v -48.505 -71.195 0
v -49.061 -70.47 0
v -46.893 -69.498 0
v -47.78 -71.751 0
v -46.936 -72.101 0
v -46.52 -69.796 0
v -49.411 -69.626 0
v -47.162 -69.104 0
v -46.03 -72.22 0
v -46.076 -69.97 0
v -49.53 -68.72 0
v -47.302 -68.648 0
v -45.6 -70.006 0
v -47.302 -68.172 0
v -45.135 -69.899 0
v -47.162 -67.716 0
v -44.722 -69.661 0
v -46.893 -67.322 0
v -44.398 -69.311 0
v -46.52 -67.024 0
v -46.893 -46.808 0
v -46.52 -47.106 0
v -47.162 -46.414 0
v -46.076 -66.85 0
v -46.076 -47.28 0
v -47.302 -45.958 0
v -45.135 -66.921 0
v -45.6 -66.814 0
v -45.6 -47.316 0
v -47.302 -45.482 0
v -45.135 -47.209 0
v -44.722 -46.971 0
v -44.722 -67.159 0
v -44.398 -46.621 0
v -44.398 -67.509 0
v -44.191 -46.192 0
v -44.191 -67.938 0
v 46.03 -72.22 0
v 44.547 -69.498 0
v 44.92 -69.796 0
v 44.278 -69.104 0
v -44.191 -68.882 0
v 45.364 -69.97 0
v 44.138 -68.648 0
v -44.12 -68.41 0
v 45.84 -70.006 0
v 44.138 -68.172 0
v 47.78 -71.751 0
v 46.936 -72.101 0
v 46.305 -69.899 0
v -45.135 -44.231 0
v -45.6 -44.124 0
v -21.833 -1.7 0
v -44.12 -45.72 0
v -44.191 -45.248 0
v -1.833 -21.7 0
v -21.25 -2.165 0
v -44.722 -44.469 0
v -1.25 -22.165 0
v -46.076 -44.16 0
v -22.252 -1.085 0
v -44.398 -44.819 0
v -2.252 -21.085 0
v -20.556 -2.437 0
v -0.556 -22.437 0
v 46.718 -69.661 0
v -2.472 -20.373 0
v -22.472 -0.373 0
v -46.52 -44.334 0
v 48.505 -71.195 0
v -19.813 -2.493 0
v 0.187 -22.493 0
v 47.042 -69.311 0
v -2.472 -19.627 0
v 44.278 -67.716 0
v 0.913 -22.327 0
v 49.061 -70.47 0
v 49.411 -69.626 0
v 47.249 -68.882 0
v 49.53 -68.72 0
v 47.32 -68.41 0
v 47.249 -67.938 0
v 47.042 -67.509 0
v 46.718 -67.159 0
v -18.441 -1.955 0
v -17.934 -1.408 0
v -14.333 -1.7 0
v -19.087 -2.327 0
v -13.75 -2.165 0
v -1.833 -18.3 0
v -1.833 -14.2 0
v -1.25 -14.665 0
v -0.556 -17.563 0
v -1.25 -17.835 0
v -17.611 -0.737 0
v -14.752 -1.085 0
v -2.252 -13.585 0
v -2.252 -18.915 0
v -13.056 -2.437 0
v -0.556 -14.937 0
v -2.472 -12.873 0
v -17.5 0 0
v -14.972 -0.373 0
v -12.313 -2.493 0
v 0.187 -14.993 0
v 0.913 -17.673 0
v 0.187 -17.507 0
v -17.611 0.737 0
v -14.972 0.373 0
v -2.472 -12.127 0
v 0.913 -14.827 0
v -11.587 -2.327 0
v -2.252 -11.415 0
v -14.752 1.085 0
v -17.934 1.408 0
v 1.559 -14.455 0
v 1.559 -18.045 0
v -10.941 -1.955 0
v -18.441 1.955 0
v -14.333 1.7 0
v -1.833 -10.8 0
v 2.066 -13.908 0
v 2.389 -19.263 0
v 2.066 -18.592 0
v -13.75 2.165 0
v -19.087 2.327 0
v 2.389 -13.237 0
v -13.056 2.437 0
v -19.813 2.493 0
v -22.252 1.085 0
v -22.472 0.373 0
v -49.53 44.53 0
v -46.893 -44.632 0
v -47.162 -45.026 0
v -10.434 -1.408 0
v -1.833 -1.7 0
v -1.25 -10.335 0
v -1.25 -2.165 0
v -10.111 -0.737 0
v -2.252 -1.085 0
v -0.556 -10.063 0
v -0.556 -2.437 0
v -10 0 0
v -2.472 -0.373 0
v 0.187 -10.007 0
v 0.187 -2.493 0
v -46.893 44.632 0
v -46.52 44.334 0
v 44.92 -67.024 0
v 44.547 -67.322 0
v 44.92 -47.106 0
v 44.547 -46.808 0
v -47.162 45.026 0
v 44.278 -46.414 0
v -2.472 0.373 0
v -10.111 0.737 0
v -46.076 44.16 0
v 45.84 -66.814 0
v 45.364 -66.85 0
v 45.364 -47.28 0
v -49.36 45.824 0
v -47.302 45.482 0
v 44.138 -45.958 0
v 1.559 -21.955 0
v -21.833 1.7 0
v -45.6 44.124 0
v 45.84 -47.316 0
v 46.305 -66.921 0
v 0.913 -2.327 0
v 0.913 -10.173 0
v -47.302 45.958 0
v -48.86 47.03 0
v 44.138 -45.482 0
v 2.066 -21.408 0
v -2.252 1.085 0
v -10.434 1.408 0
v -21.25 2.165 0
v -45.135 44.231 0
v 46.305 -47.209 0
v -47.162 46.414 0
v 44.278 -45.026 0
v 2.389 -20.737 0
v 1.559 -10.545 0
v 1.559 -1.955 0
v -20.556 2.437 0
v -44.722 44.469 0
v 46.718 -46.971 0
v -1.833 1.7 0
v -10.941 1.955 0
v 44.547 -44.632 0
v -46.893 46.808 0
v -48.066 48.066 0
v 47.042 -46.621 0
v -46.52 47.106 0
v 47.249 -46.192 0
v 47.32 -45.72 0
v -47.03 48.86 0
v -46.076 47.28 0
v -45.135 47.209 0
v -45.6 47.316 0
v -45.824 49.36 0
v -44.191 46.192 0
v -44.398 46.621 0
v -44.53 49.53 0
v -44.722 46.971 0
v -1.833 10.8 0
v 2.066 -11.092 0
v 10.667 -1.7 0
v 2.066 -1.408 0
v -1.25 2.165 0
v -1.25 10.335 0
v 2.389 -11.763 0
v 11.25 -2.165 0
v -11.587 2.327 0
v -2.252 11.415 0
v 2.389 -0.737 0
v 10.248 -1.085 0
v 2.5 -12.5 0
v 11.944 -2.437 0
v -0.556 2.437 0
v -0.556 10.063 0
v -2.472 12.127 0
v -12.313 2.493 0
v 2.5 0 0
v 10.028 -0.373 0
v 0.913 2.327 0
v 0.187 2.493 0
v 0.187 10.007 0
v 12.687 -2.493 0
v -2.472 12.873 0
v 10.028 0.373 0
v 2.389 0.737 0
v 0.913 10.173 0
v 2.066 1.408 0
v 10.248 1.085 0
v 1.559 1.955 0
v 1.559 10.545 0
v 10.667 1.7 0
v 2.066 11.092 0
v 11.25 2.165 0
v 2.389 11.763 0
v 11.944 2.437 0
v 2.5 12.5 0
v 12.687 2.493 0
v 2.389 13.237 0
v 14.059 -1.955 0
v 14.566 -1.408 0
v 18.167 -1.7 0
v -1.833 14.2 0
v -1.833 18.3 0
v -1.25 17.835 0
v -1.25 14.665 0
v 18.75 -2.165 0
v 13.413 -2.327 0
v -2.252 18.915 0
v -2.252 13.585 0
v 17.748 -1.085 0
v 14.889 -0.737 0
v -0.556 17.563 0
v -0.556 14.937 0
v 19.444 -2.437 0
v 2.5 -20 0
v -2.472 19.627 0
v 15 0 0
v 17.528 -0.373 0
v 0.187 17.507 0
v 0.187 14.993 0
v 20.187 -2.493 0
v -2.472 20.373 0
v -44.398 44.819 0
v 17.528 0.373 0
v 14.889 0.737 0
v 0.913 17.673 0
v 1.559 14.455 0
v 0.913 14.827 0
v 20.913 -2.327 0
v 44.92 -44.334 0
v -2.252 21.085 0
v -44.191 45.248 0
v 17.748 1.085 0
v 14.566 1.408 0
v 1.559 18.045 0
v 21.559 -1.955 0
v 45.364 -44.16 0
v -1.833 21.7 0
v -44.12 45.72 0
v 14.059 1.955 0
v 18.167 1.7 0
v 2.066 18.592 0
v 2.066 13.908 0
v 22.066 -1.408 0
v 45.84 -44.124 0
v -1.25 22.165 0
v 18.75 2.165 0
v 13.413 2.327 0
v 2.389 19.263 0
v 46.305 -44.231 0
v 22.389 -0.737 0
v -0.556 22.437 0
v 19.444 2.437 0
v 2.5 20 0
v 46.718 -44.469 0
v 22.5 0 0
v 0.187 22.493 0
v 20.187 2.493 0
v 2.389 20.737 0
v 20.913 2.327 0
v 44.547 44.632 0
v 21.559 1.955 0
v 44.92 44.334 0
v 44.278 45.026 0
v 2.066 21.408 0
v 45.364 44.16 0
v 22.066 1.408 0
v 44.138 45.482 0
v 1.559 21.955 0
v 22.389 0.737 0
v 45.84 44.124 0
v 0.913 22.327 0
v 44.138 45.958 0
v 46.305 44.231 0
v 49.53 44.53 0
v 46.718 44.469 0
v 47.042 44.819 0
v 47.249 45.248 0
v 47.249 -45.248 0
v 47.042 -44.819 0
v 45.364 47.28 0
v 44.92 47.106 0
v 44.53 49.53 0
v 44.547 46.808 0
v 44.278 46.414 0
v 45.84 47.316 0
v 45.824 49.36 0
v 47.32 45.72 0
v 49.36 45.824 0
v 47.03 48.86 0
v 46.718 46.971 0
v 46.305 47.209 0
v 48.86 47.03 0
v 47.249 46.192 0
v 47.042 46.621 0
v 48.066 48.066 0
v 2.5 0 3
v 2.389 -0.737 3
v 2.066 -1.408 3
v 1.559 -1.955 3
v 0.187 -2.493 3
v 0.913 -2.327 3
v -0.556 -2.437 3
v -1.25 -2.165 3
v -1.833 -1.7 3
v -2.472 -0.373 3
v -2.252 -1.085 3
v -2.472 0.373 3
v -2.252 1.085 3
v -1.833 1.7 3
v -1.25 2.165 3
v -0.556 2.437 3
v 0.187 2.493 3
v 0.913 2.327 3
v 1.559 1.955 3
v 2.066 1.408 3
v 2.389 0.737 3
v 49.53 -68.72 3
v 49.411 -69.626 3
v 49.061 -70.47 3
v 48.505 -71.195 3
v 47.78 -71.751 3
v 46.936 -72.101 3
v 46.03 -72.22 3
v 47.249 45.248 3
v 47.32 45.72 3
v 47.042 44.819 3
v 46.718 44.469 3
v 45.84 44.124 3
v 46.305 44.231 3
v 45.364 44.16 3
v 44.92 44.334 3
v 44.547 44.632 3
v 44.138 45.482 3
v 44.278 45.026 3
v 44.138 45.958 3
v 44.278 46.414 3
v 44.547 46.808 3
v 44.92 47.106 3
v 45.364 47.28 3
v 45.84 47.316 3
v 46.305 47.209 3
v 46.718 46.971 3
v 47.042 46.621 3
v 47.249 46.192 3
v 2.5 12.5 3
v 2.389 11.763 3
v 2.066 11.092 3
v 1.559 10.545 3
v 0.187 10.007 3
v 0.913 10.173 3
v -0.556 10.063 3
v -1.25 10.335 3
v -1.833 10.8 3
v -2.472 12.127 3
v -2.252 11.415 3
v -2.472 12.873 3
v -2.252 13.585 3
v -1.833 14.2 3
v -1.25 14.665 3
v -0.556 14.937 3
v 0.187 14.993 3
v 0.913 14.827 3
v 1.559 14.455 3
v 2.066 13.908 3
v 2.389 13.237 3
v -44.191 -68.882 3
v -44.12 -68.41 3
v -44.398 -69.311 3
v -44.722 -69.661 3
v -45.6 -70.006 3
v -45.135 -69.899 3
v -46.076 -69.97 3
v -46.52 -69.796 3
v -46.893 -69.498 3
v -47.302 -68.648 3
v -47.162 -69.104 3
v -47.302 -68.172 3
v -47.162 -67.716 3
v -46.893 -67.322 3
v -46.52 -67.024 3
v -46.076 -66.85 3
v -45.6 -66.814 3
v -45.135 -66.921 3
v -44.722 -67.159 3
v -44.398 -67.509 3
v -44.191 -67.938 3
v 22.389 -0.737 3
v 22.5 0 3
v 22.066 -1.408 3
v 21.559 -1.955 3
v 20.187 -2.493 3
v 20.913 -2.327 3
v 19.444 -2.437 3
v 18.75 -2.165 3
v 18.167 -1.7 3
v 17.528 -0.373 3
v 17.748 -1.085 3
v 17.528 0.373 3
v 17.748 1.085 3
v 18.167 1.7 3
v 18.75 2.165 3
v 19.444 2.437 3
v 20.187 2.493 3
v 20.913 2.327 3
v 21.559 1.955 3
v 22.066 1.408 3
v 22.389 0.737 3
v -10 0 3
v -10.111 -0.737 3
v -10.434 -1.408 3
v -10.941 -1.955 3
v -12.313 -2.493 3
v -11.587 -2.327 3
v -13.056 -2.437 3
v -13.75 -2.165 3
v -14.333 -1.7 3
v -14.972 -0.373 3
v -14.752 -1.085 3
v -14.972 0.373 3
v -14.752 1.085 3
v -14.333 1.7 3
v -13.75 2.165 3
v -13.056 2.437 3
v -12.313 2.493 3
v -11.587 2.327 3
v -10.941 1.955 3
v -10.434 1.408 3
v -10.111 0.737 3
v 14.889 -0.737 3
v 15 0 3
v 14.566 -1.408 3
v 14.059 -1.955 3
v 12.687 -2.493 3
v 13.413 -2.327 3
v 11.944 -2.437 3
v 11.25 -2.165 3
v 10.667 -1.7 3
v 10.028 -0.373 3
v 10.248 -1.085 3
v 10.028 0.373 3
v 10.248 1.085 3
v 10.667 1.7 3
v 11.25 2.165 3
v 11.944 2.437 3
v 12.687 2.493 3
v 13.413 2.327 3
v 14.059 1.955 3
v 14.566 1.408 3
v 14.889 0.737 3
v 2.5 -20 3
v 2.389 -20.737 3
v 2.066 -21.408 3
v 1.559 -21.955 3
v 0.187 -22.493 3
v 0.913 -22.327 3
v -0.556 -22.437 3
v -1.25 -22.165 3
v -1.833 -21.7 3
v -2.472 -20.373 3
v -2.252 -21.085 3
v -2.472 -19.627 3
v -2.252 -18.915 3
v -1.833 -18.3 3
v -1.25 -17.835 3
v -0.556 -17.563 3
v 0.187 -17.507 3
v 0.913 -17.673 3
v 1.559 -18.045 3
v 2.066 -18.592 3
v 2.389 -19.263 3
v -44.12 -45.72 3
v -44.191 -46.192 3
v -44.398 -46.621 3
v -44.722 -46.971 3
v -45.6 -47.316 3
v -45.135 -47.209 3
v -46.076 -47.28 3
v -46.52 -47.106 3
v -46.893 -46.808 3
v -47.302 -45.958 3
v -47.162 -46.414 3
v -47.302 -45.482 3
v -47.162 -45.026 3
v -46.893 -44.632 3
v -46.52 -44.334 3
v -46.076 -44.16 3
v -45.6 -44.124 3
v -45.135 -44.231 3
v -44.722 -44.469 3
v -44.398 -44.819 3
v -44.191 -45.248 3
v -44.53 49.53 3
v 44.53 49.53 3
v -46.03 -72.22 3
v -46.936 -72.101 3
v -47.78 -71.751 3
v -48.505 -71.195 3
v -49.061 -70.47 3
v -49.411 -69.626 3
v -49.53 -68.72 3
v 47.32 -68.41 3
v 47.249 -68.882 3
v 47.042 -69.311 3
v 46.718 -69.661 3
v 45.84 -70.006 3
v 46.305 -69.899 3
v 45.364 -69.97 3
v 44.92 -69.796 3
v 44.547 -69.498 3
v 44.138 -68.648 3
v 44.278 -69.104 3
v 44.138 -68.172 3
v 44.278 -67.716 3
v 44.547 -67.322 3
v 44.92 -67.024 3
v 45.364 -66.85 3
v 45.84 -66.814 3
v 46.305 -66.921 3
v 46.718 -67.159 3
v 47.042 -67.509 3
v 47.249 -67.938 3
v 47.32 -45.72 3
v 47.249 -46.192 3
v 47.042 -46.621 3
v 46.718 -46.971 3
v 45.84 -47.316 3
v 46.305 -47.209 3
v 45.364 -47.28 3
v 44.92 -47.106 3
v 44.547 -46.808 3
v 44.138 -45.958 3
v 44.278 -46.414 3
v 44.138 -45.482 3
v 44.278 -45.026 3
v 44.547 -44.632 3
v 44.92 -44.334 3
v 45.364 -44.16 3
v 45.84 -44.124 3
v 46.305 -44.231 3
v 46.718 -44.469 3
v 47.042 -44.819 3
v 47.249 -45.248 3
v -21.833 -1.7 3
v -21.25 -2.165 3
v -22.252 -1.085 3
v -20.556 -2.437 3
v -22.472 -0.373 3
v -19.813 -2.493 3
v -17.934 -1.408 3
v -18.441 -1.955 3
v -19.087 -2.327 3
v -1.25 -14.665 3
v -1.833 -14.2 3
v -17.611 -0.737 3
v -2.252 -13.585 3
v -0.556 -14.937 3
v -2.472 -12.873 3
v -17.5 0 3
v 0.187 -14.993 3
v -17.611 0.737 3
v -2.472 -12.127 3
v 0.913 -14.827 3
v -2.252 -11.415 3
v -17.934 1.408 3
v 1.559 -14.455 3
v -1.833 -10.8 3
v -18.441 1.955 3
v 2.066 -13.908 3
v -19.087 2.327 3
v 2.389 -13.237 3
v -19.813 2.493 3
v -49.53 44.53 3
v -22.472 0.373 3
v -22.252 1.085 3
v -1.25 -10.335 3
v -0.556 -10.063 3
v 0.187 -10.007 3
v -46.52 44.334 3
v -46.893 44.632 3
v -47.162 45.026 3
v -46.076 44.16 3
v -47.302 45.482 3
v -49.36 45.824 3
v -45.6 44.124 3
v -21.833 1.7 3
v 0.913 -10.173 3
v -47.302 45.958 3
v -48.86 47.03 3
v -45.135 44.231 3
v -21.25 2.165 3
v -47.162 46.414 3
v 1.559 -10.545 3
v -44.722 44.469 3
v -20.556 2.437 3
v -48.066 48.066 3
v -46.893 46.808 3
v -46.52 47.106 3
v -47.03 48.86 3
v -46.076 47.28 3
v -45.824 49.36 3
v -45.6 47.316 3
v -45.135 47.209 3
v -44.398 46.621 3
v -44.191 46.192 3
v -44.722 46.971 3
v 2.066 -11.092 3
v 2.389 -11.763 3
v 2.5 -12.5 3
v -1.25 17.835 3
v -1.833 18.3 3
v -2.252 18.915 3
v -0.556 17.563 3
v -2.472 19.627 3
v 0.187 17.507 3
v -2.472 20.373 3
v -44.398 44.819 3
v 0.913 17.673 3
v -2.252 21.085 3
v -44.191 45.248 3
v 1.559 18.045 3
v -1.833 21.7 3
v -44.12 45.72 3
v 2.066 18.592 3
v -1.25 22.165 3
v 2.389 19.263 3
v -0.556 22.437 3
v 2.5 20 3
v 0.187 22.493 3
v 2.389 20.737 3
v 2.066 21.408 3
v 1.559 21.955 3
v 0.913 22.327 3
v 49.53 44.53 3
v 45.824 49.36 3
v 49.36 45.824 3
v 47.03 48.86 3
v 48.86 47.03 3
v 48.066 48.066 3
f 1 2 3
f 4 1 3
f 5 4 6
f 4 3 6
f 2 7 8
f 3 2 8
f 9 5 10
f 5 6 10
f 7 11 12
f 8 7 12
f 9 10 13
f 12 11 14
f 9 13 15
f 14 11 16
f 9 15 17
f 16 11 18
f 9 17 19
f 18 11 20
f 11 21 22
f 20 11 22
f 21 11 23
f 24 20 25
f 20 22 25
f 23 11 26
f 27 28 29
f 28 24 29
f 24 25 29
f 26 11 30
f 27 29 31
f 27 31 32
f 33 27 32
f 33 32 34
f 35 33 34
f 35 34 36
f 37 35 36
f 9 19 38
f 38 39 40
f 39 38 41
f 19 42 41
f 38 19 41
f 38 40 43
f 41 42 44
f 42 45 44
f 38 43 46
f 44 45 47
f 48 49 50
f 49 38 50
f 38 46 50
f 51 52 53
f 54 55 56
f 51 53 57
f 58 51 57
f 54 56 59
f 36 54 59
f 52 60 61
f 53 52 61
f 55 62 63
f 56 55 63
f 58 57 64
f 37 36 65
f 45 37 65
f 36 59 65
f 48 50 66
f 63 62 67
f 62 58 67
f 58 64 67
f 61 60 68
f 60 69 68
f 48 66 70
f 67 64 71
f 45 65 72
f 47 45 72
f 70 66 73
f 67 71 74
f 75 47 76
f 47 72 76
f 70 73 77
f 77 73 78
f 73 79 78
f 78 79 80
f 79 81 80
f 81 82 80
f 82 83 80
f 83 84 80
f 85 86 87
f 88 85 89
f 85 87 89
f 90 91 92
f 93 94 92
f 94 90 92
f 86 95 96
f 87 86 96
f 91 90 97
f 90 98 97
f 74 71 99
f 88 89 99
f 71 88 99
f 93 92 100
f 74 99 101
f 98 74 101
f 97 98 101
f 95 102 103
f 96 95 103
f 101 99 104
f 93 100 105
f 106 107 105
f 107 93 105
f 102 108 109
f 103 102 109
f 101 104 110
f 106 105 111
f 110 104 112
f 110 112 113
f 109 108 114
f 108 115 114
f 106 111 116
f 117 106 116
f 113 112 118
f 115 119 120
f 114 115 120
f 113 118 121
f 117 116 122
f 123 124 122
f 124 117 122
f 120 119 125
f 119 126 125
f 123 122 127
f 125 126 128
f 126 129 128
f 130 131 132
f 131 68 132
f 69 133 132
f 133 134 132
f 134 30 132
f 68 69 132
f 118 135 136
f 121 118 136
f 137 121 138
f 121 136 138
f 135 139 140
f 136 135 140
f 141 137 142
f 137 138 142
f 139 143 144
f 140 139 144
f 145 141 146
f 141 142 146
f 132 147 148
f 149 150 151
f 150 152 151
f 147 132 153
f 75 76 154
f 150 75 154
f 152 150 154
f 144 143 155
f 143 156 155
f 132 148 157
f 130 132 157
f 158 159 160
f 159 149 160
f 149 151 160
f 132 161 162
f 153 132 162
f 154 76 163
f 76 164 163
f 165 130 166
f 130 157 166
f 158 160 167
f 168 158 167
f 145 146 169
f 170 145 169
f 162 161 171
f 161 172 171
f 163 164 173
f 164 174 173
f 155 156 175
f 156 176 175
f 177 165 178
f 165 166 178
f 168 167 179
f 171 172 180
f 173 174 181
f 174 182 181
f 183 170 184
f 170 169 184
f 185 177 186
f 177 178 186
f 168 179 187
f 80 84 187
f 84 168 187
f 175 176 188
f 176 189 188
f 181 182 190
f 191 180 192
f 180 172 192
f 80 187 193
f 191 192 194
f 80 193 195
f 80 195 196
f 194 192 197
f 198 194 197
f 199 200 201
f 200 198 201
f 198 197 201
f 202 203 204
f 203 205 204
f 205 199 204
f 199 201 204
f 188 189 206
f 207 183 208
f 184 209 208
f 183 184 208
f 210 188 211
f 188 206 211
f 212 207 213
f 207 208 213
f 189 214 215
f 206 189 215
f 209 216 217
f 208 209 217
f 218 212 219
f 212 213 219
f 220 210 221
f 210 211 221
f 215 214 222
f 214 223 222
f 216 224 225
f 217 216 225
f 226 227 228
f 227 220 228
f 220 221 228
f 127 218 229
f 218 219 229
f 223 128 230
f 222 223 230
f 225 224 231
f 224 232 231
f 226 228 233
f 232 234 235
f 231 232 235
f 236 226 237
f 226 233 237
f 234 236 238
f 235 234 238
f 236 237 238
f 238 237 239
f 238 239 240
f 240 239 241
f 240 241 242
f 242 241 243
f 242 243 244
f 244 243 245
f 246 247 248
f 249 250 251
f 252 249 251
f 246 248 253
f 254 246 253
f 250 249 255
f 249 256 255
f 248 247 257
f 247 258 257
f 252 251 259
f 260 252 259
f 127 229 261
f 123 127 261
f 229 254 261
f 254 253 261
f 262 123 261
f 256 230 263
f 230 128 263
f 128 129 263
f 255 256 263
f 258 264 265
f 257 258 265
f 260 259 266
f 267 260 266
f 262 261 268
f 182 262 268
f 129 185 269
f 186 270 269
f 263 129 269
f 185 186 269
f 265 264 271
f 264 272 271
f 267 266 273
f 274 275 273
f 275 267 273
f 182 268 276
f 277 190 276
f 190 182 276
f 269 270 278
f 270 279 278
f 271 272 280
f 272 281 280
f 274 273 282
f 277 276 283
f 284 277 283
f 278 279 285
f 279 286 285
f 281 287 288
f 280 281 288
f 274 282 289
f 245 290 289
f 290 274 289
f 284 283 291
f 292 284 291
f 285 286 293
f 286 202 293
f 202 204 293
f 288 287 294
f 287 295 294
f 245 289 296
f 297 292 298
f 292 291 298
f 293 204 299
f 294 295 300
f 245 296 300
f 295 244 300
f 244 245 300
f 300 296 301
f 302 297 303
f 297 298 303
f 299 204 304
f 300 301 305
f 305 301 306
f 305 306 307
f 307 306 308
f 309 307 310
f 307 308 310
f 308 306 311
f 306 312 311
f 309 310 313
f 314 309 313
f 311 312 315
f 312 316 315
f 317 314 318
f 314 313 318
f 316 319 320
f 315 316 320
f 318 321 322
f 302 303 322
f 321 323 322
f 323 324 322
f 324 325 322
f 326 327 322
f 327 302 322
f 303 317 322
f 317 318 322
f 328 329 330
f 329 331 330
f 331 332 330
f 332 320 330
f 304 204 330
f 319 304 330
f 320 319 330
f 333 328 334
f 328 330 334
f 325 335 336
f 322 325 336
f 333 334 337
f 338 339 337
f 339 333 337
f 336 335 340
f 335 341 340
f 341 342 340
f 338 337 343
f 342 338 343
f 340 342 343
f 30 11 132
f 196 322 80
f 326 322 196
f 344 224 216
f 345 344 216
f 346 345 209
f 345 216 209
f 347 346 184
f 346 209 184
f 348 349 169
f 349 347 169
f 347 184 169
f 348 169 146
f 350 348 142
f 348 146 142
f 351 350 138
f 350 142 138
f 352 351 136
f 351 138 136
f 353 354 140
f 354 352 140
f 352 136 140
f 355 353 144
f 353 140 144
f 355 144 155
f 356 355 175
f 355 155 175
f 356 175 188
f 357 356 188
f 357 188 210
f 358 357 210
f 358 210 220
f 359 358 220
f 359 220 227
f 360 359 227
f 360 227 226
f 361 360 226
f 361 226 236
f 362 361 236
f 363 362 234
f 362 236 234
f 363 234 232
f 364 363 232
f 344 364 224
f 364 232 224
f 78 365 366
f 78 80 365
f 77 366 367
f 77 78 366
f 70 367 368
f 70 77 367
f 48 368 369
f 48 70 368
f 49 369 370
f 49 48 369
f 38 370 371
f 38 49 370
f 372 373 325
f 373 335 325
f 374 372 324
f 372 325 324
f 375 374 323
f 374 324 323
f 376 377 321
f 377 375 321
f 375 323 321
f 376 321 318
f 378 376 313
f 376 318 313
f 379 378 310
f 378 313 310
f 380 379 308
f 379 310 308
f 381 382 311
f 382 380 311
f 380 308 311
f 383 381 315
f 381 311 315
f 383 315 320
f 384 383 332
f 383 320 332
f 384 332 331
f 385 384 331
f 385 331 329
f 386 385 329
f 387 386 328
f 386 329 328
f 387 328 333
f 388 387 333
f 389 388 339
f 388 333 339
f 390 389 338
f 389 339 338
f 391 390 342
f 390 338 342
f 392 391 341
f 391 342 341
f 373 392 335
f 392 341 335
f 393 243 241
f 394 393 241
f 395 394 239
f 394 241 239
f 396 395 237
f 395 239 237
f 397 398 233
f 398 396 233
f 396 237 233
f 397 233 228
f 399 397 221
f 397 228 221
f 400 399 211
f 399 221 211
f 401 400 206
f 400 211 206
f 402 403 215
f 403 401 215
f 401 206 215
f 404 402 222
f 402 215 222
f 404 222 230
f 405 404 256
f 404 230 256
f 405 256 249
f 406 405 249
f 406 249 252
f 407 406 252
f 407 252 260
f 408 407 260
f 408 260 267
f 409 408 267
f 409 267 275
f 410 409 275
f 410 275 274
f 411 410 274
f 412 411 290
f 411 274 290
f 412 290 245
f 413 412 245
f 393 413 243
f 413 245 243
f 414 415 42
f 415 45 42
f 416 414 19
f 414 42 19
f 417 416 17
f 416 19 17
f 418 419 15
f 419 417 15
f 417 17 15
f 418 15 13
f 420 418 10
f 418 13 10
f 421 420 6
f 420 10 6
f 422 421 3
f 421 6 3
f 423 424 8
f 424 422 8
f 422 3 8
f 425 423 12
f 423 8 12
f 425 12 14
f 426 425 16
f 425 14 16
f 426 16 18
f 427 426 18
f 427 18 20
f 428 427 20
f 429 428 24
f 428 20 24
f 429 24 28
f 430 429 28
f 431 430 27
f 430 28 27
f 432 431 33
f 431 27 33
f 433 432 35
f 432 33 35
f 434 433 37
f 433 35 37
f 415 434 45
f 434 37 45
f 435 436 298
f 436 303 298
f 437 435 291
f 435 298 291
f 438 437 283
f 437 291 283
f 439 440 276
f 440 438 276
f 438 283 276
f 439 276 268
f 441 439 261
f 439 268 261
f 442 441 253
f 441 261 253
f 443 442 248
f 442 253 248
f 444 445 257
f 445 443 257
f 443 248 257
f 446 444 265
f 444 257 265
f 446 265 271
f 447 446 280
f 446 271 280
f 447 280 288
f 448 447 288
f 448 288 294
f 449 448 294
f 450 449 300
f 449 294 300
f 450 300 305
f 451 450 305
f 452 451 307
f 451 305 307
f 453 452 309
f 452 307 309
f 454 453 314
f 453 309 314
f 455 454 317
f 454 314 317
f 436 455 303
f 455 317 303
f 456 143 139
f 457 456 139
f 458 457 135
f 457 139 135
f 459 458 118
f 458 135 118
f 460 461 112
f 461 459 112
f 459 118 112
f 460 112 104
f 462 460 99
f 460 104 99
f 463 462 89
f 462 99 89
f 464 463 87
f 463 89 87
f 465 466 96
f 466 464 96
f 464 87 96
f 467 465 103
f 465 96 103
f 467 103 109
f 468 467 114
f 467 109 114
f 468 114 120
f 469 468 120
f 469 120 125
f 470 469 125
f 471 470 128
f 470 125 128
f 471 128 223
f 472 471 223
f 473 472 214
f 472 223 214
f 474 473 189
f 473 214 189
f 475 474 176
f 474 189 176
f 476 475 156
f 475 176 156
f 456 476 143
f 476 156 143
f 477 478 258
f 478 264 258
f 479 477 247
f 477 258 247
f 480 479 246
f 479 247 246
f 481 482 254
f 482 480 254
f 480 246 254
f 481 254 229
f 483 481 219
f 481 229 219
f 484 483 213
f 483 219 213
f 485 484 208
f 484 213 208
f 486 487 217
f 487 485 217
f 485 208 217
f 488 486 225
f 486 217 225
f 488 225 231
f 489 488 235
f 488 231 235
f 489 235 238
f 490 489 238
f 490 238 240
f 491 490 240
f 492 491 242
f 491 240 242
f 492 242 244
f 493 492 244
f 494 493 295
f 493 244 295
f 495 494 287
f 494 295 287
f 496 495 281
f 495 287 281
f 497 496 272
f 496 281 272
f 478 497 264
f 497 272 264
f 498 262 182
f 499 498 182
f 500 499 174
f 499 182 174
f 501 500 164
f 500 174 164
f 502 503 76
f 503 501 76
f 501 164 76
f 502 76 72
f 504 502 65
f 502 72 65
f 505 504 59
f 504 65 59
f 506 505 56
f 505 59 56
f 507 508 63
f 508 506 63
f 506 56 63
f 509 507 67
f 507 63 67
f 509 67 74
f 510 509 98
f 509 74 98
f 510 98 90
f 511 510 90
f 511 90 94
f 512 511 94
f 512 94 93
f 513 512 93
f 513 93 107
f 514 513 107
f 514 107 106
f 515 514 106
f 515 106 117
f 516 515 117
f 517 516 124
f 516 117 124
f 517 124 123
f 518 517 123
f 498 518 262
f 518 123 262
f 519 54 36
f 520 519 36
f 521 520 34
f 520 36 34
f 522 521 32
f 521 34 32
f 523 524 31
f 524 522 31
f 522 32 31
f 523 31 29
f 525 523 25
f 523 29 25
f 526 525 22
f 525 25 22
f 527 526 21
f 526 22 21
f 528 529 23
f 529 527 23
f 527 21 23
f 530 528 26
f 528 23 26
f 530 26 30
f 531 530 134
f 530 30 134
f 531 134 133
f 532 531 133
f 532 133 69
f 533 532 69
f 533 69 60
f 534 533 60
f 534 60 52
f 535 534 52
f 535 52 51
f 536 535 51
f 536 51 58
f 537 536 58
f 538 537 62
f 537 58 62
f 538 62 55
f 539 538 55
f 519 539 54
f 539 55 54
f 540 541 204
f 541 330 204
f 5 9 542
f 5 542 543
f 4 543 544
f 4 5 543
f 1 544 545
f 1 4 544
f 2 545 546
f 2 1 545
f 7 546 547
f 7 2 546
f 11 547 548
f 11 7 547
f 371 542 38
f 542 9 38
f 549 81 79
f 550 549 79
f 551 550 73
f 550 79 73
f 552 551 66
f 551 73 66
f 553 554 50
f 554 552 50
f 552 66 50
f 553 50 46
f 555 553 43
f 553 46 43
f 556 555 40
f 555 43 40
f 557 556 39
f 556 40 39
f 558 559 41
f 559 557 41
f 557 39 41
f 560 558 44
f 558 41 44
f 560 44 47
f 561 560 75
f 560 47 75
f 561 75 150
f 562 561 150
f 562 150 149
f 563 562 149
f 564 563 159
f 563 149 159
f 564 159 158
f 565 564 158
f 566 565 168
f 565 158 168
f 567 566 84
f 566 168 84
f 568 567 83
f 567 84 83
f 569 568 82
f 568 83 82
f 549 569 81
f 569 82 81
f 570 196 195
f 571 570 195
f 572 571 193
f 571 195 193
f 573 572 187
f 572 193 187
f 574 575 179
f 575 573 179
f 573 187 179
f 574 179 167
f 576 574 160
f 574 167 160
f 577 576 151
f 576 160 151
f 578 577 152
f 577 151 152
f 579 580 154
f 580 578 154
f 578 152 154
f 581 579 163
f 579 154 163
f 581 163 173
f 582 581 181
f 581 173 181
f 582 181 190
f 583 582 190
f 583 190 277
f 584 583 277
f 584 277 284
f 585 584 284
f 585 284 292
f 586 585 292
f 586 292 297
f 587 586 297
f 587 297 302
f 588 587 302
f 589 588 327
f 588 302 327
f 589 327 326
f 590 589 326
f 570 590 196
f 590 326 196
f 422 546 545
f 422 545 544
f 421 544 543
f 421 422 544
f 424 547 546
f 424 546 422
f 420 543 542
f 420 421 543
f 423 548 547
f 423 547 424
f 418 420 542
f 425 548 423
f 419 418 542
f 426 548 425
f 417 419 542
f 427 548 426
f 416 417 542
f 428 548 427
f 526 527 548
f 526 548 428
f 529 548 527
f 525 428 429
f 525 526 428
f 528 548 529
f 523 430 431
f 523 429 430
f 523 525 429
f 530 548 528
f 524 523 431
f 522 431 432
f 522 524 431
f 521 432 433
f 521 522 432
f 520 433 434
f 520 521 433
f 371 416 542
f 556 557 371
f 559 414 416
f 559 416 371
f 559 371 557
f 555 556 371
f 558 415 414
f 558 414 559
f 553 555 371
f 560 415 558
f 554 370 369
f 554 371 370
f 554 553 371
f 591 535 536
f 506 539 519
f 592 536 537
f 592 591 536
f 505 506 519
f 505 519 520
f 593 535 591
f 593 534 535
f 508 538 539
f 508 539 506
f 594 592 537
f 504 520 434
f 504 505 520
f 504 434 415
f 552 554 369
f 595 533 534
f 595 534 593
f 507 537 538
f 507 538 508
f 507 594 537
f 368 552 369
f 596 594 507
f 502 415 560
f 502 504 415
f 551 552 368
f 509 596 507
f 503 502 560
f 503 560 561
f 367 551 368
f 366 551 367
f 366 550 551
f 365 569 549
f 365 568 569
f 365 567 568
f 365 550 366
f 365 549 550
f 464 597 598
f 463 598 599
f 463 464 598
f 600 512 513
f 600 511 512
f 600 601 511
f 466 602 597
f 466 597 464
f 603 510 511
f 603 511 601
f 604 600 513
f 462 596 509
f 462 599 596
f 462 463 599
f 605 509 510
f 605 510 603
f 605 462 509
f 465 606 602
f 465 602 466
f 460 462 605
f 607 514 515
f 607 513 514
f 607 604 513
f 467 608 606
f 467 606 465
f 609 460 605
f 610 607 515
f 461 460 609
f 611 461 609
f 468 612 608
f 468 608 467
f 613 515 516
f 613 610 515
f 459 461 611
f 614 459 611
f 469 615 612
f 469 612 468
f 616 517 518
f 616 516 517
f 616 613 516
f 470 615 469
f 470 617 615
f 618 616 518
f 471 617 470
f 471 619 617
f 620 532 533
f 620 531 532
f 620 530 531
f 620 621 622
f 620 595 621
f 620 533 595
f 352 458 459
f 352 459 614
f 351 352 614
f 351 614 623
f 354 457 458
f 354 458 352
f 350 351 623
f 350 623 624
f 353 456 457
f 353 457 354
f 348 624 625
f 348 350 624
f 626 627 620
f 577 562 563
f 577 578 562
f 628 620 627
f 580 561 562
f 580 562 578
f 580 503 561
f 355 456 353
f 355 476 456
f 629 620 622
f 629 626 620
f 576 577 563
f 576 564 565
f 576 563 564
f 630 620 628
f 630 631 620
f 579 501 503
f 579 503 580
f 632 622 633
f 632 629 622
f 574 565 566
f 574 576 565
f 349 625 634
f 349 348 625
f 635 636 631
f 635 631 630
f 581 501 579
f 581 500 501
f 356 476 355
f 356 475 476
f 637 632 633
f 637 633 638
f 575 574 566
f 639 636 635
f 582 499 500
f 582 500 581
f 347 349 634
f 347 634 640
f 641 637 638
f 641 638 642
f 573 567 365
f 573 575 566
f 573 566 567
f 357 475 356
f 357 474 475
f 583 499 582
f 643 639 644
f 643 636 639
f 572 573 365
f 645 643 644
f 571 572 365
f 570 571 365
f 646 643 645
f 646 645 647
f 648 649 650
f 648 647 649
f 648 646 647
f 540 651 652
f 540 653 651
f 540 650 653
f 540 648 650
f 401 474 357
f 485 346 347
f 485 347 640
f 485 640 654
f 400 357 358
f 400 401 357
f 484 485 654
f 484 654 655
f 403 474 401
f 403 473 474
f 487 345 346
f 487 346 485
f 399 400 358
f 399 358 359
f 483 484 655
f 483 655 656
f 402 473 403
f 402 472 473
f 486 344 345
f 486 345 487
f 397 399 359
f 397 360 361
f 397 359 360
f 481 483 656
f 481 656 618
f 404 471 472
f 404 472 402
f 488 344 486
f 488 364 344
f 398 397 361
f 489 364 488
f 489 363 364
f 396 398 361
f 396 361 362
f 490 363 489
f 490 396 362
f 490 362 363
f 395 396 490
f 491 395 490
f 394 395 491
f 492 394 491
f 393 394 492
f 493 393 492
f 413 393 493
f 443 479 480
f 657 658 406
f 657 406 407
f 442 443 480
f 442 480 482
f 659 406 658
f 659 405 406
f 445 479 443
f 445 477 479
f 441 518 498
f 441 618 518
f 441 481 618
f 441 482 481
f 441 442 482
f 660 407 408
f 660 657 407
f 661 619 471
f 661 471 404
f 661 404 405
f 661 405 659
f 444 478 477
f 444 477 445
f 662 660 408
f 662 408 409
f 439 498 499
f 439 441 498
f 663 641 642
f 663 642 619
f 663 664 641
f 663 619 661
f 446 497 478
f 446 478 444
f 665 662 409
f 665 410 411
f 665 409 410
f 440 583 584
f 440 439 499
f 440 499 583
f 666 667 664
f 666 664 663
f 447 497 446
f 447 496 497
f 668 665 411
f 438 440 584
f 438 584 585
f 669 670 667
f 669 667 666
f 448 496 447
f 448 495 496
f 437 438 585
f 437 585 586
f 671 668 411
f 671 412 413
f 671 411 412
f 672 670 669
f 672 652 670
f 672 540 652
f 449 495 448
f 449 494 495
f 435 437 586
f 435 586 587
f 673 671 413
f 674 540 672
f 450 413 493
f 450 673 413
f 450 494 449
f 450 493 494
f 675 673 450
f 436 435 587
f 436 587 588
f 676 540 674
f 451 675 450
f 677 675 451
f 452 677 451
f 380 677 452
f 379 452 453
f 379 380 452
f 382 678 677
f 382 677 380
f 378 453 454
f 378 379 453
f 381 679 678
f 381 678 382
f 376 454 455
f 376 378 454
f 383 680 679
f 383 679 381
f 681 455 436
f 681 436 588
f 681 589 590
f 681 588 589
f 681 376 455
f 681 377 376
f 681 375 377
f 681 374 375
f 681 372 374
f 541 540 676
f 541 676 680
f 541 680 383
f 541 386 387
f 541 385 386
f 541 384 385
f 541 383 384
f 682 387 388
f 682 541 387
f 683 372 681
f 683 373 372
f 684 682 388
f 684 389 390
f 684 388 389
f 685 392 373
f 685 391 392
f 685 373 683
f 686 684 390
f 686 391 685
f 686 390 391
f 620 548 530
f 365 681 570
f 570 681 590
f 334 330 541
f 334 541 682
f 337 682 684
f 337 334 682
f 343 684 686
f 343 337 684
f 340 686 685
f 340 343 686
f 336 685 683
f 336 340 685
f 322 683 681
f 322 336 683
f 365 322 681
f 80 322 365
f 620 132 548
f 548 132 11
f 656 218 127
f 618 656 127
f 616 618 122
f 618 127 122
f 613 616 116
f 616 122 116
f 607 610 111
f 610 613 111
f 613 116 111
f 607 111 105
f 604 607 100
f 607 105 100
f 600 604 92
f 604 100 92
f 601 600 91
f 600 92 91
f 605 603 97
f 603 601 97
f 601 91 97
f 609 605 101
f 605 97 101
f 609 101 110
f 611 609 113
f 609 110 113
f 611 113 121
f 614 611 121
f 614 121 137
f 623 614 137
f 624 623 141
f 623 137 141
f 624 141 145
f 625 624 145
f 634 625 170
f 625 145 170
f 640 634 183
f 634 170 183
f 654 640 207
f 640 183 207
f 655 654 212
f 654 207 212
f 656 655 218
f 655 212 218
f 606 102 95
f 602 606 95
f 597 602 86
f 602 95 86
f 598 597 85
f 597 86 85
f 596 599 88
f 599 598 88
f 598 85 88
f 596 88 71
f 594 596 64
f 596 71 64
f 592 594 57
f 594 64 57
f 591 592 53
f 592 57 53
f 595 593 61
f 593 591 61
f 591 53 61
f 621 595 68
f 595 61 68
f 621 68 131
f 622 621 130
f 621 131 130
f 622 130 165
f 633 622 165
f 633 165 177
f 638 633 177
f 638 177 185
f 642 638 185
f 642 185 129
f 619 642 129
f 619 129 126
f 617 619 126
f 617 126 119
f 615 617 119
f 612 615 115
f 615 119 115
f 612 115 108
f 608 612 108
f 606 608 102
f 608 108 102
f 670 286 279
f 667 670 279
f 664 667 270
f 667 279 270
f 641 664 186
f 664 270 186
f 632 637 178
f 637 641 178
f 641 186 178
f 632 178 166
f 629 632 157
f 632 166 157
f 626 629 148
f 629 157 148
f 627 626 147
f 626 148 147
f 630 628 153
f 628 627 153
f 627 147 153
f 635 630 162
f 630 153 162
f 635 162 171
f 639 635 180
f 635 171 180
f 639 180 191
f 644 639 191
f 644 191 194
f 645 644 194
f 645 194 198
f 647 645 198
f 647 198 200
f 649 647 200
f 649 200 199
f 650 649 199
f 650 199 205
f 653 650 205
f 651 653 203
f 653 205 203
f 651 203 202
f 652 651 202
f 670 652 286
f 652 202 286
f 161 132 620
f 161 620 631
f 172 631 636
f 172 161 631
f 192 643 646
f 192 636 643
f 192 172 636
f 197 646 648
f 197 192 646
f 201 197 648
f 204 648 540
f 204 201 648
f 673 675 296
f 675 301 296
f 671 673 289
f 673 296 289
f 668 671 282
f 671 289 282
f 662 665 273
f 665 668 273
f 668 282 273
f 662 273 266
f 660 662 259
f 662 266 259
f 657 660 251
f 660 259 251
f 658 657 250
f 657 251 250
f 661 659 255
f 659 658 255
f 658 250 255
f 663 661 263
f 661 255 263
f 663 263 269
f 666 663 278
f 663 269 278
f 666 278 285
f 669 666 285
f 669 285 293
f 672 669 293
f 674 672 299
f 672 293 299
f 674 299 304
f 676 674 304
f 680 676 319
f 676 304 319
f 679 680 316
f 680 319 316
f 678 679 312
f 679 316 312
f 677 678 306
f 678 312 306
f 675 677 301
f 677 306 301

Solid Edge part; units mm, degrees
sketch "Sketch1" plane through (0, 0, 0) normal (0, 0, 1) x (1, 0, 0)
  circle A0 centre (45.72, -45.72) radius 1.6
  line L0 (-49.53, 44.53) -> (-49.53, -68.72)
  arc A1 (-49.53, -68.72) -> (-46.03, -72.22) centre (-46.03, -68.72) ccw
  line L1 (-46.03, -72.22) -> (46.03, -72.22)
  arc A2 (49.53, -68.72) -> (46.03, -72.22) centre (46.03, -68.72) cw
  line L2 (49.53, 44.53) -> (49.53, -68.72)
  arc A3 (44.53, 49.53) -> (49.53, 44.53) centre (44.53, 44.53) cw
  line L3 (44.53, 49.53) -> (-44.53, 49.53)
  arc A4 (-44.53, 49.53) -> (-49.53, 44.53) centre (-44.53, 44.53) ccw
  circle A5 centre (45.72, 45.72) radius 1.6
  circle A6 centre (-45.72, -45.72) radius 1.6
  circle A7 centre (-45.72, 45.72) radius 1.6
  circle A8 centre (45.72, -68.41) radius 1.6
  circle A9 centre (-45.72, -68.41) radius 1.6
  circle A10 centre (0, -12.5) radius 2.5
  circle A11 centre (20, 0) radius 2.5
  circle A12 centre (0, 20) radius 2.5
  circle A13 centre (0, 0) radius 2.5
  circle A14 centre (-20, 0) radius 2.5
  circle A15 centre (0, 12.5) radius 2.5
  circle A16 centre (12.5, 0) radius 2.5
  circle A17 centre (0, -20) radius 2.5
  circle A18 centre (-12.5, 0) radius 2.5
  dimension "D1" = 3.2
  dimension "D2" = 5
  dimension "D3" = 5
  dimension "D4" = 3.81
  dimension "D5" = 3.81
  dimension "D6" = 3.81
  dimension "D7" = 113.25
  dimension "D8" = 113.25
  dimension "D9" = 3.5
  dimension "D10" = 3.5
  dimension "D11" = 3.81
  dimension "D12" = 3.81
  dimension "D13" = 3.81
  dimension "D14" = 3.81
  dimension "D15" = 5
  dimension "D16" = 5
  dimension "D17" = 5
  dimension "D18" = 5
  dimension "D19" = 5
  dimension "D20" = 5
  dimension "D21" = 5
  dimension "D22" = 5
  dimension "D23" = 5
extrude "Protrusion1" add sketch "Sketch1" along normal blind 3
properties material "Acrylic, high impact grade"
